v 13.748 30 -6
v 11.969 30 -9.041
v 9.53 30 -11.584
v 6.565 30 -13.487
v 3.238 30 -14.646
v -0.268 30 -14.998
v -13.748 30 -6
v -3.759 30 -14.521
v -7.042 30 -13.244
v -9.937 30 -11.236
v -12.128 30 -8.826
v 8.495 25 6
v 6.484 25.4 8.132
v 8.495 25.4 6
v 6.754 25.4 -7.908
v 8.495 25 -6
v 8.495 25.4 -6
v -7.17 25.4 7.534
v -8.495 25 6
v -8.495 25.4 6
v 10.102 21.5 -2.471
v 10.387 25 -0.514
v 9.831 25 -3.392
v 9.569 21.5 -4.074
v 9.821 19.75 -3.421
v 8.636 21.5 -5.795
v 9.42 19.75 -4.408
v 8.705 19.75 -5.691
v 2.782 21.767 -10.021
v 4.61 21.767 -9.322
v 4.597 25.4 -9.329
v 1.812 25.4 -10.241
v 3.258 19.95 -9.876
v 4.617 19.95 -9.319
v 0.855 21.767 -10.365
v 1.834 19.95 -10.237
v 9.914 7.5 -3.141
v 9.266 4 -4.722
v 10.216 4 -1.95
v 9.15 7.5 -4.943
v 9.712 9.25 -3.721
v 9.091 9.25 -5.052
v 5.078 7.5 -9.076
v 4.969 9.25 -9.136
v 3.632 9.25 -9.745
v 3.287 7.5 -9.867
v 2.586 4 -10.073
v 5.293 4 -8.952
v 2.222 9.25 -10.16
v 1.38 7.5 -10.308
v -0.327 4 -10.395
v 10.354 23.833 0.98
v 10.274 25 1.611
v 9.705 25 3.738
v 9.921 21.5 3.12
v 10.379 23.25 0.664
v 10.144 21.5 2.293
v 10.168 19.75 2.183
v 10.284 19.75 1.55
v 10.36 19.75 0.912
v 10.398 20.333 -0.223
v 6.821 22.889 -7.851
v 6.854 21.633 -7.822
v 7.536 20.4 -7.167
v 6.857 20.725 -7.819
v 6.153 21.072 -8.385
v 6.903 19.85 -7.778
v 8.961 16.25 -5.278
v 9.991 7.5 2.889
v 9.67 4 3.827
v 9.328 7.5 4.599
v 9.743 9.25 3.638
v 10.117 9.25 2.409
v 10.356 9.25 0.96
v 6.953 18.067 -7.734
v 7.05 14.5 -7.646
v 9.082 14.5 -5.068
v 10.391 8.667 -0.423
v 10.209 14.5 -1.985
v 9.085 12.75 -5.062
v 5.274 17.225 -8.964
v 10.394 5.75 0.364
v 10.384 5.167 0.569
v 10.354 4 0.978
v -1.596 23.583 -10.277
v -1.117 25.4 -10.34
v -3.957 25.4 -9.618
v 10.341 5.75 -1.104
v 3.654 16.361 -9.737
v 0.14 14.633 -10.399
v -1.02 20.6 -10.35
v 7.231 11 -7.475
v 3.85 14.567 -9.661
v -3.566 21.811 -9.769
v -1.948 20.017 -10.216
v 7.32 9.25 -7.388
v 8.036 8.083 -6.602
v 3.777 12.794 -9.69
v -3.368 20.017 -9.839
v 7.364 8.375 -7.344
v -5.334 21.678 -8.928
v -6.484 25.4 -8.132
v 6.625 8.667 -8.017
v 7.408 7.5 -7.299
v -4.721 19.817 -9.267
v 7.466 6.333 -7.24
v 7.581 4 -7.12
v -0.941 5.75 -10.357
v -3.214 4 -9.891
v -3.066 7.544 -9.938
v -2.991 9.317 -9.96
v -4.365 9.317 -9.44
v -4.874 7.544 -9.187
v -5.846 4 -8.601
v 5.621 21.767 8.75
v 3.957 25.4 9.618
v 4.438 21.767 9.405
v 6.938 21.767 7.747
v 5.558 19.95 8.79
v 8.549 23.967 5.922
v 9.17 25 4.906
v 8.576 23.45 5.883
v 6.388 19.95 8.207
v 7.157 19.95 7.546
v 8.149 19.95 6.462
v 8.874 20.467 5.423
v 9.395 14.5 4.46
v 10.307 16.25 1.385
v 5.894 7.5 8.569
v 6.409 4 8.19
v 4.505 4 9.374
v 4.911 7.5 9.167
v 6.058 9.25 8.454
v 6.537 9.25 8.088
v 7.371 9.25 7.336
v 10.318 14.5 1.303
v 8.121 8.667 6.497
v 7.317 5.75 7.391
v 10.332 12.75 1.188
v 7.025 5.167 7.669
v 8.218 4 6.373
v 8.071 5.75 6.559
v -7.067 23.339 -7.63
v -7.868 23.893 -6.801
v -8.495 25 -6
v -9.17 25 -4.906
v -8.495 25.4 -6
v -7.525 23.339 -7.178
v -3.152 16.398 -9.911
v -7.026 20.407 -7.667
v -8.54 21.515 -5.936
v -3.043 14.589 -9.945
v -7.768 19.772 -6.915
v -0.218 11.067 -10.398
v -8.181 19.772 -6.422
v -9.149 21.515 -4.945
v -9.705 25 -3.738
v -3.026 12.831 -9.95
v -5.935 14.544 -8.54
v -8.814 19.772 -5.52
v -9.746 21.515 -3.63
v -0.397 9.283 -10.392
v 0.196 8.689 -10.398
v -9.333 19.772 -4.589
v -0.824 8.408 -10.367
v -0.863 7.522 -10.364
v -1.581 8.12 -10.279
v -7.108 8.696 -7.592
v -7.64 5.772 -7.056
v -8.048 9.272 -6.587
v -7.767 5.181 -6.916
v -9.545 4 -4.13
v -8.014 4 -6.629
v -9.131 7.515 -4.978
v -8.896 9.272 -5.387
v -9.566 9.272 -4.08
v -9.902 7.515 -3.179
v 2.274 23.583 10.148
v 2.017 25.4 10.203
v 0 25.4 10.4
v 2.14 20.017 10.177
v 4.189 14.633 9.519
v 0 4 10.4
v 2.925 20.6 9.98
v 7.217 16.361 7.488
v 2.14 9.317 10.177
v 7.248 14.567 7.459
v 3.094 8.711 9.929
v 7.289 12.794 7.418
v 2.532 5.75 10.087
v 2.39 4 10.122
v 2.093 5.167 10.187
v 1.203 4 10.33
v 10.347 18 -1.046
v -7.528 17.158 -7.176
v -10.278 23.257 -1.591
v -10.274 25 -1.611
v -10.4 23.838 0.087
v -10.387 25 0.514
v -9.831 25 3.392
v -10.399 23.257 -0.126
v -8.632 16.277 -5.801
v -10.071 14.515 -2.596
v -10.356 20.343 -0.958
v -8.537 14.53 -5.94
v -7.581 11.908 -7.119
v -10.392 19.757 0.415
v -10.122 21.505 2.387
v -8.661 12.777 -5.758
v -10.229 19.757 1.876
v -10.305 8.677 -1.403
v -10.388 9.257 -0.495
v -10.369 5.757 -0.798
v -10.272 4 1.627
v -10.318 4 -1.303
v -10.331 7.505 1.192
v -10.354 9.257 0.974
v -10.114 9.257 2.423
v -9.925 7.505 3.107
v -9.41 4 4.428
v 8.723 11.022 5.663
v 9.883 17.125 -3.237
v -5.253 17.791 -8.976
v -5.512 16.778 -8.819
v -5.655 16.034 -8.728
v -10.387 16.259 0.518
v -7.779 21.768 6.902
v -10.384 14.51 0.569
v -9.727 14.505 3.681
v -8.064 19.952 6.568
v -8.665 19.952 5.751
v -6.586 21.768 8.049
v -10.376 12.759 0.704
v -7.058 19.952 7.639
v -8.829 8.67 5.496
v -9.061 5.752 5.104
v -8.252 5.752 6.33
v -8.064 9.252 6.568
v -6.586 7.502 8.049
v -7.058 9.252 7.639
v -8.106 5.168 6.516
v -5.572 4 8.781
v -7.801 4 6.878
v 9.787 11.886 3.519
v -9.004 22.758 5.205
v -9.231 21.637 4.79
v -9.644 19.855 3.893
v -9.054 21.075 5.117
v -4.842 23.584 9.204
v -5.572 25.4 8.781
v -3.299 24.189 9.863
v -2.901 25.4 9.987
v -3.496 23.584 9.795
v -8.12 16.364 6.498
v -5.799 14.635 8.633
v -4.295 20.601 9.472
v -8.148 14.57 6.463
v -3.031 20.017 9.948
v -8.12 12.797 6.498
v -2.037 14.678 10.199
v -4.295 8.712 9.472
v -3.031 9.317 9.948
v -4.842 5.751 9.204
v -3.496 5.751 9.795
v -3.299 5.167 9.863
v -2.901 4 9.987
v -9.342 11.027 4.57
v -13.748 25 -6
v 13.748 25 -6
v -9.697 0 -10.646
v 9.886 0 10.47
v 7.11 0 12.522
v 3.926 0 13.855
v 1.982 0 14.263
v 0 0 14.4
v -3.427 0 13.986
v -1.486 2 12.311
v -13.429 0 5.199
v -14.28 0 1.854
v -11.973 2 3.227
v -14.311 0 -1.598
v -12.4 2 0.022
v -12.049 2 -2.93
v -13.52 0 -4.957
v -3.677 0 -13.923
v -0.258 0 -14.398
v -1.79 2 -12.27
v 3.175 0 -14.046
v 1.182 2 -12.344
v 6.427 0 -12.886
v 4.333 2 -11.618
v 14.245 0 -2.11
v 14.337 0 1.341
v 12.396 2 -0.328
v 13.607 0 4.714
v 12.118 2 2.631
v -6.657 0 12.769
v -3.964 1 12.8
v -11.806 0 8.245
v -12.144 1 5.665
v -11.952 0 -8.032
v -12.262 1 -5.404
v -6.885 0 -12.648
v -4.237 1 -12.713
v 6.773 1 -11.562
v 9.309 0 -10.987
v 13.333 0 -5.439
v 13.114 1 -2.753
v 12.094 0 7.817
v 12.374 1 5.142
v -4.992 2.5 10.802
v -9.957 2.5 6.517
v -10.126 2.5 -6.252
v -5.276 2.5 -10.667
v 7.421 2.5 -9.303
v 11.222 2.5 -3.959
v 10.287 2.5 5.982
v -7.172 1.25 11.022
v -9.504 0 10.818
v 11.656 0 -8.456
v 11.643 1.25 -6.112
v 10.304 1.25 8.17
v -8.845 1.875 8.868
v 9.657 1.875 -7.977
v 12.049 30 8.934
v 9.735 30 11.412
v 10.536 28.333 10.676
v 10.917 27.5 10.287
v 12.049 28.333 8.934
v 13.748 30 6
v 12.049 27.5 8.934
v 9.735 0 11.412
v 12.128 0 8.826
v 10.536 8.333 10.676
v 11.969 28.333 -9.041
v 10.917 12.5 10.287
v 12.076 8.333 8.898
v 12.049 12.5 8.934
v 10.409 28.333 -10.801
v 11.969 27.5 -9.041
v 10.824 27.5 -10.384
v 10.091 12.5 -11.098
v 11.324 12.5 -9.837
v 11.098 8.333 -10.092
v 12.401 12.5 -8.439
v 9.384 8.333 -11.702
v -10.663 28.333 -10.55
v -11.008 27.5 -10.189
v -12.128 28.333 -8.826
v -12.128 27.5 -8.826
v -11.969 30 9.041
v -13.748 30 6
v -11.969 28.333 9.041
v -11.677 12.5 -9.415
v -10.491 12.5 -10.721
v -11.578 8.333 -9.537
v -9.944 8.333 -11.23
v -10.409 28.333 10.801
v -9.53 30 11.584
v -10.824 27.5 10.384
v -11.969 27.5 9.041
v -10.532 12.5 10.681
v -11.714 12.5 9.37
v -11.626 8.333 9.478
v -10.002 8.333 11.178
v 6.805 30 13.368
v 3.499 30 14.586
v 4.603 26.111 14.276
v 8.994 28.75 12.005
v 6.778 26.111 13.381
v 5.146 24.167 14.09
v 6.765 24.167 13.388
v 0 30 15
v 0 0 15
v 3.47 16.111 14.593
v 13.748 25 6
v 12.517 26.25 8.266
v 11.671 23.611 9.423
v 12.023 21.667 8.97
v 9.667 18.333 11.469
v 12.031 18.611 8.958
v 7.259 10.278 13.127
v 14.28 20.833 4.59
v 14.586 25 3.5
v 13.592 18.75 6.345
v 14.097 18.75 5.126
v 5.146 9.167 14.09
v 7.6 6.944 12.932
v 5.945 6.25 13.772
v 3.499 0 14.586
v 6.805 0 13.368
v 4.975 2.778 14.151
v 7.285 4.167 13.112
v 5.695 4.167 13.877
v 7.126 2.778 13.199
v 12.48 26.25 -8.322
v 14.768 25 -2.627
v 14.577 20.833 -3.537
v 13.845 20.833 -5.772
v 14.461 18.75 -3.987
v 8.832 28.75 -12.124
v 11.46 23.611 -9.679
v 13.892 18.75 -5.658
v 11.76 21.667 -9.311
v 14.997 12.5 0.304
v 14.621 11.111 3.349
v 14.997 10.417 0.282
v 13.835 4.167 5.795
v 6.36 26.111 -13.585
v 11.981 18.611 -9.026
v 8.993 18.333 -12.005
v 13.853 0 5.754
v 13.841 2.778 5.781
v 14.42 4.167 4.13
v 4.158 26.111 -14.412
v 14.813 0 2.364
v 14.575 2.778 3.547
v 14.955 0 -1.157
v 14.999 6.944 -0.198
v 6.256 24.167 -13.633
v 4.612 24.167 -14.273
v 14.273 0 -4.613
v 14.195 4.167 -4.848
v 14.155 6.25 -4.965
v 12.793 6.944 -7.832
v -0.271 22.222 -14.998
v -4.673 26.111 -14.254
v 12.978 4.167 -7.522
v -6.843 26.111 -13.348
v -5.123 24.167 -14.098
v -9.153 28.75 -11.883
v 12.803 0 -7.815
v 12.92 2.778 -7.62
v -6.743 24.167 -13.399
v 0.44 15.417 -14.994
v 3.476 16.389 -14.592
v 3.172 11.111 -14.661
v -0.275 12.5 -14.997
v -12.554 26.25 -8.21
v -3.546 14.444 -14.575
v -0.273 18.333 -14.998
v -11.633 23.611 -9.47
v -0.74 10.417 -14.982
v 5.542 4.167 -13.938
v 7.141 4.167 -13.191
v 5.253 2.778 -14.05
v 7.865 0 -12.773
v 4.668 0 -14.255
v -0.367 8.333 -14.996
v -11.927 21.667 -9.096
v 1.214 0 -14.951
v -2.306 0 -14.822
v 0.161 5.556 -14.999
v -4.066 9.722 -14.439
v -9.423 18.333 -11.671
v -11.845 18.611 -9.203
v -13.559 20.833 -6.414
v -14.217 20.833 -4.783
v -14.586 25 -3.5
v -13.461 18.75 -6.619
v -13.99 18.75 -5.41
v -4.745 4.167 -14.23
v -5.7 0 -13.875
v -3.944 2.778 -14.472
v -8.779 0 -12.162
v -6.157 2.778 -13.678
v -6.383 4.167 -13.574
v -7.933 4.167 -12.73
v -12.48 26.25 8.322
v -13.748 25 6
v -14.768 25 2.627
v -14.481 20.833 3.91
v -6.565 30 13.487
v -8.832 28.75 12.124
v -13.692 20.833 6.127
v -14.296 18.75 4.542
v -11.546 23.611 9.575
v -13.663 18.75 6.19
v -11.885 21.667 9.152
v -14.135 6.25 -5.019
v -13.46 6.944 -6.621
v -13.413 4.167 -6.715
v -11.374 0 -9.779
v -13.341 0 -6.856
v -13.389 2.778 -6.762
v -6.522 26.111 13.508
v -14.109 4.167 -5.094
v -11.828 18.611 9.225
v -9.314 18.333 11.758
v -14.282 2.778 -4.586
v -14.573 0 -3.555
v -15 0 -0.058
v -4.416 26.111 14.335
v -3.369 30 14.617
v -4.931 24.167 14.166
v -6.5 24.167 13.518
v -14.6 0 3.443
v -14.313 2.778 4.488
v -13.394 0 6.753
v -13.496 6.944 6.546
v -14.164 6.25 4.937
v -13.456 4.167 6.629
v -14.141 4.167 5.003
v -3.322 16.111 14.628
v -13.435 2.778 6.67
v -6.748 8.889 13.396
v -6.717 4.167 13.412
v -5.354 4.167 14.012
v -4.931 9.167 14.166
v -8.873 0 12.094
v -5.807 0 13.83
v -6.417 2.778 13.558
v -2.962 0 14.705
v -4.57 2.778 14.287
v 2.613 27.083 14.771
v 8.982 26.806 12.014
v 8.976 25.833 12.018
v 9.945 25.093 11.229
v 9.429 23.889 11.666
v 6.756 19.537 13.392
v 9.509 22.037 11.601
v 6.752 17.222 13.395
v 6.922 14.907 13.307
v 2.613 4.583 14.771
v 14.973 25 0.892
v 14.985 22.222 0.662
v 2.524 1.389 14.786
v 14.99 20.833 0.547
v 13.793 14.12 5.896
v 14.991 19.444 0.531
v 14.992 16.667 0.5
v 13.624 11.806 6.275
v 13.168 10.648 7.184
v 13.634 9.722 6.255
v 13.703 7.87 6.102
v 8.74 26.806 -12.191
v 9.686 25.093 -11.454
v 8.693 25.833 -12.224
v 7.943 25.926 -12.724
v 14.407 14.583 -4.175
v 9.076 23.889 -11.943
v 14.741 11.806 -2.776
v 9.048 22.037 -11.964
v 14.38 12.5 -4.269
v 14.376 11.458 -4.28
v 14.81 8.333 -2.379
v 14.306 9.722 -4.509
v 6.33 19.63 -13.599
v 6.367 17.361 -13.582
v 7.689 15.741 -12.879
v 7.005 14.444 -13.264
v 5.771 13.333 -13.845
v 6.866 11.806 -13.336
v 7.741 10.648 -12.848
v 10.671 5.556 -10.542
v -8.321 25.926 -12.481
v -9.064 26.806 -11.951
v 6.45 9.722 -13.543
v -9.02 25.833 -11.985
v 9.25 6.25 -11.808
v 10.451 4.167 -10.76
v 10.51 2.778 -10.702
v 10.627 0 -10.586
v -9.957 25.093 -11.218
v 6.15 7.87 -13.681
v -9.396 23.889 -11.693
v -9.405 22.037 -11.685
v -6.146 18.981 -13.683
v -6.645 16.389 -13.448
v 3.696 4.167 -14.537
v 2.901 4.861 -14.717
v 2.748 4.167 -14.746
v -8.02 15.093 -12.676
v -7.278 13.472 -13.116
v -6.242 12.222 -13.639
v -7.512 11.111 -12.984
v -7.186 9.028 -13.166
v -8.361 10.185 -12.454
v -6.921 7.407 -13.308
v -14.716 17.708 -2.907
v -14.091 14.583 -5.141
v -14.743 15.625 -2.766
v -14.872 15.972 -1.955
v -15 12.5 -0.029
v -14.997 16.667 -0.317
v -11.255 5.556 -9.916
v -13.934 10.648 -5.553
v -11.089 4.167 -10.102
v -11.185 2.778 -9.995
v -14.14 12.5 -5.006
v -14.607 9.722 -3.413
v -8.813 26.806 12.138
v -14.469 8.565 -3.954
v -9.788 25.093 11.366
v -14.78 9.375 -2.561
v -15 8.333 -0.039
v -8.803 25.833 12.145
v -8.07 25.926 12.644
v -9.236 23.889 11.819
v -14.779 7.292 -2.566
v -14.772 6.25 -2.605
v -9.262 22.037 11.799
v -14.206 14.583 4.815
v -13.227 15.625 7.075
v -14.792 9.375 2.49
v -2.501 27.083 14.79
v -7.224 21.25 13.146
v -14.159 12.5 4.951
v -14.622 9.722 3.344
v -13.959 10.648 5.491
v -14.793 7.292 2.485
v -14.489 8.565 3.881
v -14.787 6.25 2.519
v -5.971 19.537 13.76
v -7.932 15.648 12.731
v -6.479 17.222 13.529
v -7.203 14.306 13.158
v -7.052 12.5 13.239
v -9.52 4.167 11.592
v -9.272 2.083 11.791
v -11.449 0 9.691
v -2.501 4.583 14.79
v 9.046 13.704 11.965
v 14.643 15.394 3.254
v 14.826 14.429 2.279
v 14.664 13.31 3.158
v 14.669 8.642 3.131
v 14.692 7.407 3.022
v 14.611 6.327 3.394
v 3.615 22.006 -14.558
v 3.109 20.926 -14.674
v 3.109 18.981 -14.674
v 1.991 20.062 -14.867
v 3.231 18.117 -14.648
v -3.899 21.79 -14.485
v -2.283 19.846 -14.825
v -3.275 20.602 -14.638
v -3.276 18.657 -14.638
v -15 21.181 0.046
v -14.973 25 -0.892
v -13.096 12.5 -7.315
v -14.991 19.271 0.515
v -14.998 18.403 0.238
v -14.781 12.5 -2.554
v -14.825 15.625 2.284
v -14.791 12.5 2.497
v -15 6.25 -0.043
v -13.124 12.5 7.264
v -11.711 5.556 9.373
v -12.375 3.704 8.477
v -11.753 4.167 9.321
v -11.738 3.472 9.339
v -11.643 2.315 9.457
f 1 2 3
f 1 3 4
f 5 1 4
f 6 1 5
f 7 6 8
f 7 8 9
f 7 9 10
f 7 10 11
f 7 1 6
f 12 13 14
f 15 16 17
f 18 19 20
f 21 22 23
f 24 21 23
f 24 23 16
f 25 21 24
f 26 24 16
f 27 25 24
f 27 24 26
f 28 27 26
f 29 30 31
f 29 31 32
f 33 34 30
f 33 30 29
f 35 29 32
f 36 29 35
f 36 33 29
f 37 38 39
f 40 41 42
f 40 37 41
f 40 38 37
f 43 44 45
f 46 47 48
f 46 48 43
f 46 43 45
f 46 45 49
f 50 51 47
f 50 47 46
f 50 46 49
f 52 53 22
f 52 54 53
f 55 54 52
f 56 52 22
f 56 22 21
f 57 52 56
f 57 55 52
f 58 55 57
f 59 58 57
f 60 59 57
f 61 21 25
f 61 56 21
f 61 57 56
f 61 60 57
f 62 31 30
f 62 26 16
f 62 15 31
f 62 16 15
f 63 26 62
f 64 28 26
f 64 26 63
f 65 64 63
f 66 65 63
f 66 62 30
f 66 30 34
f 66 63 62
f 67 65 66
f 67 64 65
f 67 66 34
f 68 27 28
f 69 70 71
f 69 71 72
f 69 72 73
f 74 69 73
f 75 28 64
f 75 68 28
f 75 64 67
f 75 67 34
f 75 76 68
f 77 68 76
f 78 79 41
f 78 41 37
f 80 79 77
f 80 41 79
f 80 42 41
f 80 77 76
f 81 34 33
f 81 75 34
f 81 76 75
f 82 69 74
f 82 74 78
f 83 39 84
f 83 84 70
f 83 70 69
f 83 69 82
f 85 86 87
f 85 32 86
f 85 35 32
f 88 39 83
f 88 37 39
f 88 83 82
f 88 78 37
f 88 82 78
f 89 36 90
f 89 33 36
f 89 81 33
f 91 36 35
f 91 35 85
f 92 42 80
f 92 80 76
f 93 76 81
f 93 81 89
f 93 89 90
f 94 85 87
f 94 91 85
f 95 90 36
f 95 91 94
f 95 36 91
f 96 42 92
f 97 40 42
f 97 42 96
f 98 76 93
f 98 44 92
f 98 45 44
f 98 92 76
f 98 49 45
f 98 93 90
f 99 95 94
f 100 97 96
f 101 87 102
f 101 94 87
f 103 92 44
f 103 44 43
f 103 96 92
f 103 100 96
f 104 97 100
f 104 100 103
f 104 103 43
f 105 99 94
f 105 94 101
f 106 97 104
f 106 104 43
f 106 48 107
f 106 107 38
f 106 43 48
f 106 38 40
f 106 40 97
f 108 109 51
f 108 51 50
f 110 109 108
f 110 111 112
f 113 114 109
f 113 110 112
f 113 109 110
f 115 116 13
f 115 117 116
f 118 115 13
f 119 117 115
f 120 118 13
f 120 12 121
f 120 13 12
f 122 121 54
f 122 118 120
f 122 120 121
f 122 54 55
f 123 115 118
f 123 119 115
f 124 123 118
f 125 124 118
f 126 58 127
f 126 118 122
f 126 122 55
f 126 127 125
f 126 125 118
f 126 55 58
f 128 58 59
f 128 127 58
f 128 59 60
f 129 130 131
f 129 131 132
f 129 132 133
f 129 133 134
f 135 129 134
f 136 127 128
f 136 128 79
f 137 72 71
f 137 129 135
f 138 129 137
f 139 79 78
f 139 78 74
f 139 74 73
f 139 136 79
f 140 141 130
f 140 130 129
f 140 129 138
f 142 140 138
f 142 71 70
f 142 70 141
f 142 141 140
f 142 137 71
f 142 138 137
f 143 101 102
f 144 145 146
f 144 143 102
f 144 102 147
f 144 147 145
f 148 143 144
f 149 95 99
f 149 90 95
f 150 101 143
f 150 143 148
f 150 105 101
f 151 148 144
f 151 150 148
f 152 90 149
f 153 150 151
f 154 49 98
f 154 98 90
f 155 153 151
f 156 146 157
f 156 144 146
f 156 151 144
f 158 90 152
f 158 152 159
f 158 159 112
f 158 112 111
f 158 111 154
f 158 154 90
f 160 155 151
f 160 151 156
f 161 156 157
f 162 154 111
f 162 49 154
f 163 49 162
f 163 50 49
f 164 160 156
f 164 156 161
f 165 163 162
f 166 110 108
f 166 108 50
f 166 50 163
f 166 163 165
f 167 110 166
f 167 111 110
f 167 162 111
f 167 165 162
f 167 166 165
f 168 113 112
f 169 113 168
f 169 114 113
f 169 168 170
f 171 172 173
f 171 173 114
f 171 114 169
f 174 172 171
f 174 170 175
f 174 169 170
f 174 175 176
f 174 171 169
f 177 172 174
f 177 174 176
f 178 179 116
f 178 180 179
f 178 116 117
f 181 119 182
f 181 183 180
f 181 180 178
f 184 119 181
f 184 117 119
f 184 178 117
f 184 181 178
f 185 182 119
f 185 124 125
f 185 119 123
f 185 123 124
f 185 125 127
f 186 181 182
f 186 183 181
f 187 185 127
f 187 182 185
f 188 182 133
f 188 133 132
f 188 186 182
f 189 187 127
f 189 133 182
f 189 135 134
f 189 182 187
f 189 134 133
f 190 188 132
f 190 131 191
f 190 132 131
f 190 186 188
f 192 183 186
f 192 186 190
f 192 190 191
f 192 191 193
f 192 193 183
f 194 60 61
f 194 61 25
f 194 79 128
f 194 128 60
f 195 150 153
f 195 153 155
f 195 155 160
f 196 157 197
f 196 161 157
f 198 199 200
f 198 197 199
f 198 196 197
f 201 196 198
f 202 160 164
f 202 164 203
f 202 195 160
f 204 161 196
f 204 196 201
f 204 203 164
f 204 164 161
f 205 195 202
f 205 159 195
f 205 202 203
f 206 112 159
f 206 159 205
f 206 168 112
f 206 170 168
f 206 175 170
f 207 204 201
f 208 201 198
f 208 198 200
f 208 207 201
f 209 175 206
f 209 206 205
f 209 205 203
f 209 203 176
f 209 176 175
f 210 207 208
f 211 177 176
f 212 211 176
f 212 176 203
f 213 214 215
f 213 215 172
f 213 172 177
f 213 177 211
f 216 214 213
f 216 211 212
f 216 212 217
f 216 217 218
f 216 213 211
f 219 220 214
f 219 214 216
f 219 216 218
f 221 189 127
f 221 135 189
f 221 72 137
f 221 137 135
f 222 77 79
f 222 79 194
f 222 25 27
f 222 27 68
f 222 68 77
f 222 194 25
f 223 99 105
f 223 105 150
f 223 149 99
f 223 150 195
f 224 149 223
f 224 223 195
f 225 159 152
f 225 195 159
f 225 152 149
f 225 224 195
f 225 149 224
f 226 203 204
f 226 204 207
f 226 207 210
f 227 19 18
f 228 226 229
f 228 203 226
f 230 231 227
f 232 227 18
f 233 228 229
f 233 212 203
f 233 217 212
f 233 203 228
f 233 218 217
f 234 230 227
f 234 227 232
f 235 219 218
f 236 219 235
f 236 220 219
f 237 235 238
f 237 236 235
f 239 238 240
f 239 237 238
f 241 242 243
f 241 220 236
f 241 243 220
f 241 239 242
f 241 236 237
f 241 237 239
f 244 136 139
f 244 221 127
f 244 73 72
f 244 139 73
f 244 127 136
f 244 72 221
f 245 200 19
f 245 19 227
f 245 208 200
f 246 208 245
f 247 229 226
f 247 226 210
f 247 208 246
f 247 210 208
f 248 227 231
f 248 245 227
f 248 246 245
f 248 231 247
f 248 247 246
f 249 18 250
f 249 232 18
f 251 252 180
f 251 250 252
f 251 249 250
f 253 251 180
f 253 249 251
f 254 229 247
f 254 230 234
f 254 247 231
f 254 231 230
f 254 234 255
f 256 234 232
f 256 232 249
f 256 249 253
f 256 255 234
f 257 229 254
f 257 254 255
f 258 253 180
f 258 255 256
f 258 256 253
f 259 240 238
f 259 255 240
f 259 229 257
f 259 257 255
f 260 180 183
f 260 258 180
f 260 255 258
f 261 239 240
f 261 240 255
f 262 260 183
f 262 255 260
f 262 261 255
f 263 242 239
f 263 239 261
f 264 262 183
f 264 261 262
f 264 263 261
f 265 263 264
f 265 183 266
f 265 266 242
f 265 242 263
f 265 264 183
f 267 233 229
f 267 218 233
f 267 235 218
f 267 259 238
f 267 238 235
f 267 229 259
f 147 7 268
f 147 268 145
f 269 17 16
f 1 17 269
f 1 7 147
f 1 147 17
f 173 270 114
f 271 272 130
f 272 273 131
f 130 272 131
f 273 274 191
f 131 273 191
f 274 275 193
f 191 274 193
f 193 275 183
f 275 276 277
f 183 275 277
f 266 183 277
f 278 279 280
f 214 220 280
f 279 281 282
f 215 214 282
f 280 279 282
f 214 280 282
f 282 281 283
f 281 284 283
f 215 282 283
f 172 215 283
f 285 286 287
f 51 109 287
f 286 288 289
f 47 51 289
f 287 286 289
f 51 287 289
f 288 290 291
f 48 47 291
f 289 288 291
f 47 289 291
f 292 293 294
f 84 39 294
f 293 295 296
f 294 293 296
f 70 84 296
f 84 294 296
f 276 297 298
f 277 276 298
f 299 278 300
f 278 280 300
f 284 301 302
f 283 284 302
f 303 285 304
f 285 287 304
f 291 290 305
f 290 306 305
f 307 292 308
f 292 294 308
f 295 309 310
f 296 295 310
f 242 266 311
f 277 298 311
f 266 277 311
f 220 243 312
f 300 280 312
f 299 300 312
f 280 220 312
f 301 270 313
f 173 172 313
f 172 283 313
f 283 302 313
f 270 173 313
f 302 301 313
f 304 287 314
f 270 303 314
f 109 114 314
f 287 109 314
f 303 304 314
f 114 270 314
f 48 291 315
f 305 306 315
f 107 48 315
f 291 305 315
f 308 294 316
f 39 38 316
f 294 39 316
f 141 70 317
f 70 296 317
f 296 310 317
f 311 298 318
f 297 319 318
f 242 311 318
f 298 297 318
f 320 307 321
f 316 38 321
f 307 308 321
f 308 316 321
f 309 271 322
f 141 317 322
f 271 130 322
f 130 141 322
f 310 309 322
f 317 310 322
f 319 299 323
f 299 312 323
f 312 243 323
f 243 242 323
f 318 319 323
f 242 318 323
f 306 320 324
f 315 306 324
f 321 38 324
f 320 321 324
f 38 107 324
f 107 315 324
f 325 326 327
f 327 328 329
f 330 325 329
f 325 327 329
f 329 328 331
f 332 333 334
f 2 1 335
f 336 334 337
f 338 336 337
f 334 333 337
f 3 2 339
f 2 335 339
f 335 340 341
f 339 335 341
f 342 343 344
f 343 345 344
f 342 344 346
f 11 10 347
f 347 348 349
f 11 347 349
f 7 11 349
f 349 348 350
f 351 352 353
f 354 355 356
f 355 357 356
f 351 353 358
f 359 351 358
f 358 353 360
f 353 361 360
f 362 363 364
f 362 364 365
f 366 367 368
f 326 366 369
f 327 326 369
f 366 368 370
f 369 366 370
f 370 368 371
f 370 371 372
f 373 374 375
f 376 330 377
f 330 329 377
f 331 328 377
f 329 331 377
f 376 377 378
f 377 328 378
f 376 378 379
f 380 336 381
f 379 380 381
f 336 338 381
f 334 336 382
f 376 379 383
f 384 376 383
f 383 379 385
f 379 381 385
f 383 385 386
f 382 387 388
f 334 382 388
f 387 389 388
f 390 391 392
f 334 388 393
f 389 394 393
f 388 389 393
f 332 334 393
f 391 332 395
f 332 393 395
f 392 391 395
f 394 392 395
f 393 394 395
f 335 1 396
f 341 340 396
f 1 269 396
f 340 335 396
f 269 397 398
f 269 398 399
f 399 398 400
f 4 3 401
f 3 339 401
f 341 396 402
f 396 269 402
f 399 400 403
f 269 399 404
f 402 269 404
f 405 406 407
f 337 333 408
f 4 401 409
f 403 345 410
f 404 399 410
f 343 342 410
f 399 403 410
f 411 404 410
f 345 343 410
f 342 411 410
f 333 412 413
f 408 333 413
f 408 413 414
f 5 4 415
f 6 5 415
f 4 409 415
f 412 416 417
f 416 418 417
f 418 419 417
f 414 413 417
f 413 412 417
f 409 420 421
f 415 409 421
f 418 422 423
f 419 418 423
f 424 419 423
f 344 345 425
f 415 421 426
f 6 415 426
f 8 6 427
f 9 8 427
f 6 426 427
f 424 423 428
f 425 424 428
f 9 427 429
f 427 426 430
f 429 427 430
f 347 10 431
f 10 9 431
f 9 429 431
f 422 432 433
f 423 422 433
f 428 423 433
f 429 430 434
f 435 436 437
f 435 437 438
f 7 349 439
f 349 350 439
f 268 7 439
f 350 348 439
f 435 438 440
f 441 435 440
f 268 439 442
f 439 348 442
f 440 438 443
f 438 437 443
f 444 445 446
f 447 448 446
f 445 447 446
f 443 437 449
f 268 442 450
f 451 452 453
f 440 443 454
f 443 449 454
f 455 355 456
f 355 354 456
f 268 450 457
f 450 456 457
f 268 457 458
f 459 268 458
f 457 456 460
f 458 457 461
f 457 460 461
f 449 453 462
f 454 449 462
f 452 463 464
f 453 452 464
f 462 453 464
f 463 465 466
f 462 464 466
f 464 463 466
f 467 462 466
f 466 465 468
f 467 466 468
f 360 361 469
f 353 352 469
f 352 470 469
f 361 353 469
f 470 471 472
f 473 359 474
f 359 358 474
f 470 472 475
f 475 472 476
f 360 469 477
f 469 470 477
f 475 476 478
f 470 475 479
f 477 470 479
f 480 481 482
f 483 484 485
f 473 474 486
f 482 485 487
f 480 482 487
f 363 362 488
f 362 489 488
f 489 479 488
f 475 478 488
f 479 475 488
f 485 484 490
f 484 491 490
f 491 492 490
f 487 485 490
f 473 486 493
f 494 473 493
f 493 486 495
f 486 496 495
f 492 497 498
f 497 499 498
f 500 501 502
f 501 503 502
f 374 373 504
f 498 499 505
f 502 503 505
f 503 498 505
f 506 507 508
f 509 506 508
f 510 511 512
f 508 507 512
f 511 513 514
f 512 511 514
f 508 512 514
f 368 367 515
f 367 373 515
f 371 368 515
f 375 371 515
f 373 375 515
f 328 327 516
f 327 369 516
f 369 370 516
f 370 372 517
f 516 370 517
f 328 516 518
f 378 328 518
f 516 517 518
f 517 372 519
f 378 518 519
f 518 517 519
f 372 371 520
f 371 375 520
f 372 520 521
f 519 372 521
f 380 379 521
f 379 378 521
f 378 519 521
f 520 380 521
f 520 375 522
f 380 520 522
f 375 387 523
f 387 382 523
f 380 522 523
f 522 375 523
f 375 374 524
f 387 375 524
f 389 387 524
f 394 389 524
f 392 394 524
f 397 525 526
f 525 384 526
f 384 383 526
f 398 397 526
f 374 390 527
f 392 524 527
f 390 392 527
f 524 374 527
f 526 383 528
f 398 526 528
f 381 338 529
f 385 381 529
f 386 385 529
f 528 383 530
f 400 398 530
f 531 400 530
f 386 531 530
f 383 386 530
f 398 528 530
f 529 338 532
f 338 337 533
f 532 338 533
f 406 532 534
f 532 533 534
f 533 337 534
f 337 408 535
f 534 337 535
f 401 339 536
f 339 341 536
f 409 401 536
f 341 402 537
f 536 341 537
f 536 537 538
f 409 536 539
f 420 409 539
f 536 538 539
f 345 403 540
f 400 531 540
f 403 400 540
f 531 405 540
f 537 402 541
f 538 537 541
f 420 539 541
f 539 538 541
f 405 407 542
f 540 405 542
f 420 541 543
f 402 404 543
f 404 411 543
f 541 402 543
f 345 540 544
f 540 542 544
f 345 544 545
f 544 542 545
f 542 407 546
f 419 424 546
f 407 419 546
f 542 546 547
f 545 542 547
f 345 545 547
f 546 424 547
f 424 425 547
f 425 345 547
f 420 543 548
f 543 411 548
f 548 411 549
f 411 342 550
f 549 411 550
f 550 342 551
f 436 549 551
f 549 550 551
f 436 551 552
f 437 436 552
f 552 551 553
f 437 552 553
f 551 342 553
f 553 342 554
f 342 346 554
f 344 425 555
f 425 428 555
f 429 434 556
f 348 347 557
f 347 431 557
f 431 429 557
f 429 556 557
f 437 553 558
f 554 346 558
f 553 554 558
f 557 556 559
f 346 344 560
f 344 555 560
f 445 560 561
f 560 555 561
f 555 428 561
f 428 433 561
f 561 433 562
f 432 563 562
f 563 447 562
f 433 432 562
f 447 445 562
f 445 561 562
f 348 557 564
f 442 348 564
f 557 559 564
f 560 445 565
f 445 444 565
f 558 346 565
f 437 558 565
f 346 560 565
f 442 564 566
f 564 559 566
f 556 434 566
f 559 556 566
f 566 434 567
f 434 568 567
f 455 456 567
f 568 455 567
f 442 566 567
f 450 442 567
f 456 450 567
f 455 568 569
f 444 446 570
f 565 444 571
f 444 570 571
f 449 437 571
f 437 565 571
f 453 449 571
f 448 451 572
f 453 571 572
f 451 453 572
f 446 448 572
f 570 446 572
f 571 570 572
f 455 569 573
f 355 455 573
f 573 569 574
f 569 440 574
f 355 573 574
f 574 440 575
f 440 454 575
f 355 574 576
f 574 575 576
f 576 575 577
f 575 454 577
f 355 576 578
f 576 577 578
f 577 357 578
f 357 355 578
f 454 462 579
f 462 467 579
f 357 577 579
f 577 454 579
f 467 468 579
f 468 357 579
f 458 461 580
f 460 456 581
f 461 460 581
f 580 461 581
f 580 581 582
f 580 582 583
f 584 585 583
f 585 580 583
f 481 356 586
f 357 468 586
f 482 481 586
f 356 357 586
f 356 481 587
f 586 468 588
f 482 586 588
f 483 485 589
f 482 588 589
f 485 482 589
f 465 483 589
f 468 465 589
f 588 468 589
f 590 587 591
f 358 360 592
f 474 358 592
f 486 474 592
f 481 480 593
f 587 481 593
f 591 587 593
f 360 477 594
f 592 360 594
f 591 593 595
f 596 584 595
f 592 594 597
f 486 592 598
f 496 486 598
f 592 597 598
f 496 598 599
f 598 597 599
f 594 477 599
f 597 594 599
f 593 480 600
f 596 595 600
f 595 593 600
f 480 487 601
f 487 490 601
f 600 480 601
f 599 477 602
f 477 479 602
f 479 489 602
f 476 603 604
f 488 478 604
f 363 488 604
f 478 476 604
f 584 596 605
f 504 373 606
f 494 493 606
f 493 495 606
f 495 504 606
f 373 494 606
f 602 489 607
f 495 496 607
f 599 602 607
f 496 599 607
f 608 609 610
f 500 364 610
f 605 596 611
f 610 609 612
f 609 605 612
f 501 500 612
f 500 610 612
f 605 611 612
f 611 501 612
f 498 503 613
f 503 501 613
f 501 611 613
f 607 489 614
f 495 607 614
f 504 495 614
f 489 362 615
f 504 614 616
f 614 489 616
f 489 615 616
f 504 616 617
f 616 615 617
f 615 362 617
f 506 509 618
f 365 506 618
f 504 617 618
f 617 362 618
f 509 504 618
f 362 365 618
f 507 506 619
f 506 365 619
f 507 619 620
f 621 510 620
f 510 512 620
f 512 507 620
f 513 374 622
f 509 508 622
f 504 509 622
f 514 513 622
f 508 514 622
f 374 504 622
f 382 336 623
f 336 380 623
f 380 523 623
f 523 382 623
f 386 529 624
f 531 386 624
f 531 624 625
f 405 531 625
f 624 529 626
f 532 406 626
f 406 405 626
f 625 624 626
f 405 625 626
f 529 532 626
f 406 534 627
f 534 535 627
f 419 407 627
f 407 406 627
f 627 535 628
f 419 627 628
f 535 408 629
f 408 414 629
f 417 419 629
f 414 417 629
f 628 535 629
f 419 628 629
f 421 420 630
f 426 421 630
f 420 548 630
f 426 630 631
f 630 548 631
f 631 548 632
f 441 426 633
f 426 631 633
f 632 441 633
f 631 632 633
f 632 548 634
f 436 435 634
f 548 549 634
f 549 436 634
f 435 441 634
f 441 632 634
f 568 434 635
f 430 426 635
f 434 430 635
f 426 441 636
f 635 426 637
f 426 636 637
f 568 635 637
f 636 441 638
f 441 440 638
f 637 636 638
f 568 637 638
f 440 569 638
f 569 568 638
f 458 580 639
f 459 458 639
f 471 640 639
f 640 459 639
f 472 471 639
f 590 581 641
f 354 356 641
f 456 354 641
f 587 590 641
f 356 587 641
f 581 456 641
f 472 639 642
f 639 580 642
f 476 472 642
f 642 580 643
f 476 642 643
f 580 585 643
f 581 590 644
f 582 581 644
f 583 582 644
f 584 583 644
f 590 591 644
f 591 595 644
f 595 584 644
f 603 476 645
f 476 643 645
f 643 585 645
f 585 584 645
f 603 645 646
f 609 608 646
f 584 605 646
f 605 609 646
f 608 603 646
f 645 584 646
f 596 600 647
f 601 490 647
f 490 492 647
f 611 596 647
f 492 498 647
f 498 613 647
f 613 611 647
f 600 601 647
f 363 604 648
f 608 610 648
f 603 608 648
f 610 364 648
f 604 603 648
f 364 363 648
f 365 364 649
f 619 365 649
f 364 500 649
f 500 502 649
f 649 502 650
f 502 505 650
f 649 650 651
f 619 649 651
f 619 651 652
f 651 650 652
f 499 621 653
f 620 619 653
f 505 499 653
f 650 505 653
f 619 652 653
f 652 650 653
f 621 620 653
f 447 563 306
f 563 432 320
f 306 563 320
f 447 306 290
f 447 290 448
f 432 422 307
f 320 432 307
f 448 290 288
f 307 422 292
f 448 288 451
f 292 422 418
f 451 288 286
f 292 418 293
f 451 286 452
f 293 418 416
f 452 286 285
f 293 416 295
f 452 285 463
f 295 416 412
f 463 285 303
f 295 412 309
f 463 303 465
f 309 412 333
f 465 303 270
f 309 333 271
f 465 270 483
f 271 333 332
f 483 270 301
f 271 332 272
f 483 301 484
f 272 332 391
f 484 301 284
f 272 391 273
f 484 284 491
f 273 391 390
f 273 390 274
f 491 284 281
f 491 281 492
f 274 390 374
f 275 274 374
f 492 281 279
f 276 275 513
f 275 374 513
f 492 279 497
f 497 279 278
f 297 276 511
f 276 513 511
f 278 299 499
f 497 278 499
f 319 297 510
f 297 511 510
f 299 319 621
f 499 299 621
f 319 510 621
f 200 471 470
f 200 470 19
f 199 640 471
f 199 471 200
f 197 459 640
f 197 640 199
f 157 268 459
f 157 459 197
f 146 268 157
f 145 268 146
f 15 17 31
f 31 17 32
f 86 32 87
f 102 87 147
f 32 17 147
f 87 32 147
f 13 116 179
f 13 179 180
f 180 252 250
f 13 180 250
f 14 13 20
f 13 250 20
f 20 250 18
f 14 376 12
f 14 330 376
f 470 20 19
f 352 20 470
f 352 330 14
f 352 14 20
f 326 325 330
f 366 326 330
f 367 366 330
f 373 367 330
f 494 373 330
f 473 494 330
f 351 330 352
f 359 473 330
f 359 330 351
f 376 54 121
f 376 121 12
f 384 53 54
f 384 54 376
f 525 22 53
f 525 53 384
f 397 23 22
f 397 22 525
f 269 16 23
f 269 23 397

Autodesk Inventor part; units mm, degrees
ref_plane "YZ Plane" through (0, 0, 0) normal (1, 0, 0) x (0, 1, 0)
ref_plane "XZ Plane" through (0, 0, 0) normal (0, 1, 0) x (-1, 0, 0)
ref_plane "XY Plane" through (0, 0, 0) normal (0, 0, 1) x (1, 0, 0)
sketch "Esquisse1" plane through (0, 0, 0) normal (0, 1, 0) x (-1, 0, 0)
  ellipse E0 centre (0, 0) end of major axis (0, 15) minor radius 15
  dimension "d0" = 15
  dimension "d1" = 15
extrude "Extrusion1" add sketch "Esquisse1" along normal blind 30
shell "Coque1" thickness 4.6 removed faces 1 at (0.1197, 0, 4.0636)
chamfer "Chanfrein1" distance 4 angle 45 1 edges at (-0.0005, 0, -10.4)
sketch "Esquisse3" plane through (0, 30, 0) normal (0, 1, 0) x (1, 0, 0)
  circle A0 centre (0, 0) radius 15 projected
  line L0 (-20, 6) -> (20, 6)
  line L1 (20, 6) -> (20, -6)
  line L2 (20, -6) -> (-20, -6)
  line L3 (-20, -6) -> (-20, 6)
  dimension "d14" = 12
  dimension "d15" = 6
  dimension "d16" = 40
  dimension "d17" = 20
extrude "Extrusion3" cut sketch "Esquisse3" against normal blind 5 contours A0 L2 L0 | A0 L0 L1 L2 | A0 L2 L3 L0
equation "\"d15\" = 0.5 * d14"
equation "\"d17\" = 0.5 * d16"
properties part number "Cylindre"
